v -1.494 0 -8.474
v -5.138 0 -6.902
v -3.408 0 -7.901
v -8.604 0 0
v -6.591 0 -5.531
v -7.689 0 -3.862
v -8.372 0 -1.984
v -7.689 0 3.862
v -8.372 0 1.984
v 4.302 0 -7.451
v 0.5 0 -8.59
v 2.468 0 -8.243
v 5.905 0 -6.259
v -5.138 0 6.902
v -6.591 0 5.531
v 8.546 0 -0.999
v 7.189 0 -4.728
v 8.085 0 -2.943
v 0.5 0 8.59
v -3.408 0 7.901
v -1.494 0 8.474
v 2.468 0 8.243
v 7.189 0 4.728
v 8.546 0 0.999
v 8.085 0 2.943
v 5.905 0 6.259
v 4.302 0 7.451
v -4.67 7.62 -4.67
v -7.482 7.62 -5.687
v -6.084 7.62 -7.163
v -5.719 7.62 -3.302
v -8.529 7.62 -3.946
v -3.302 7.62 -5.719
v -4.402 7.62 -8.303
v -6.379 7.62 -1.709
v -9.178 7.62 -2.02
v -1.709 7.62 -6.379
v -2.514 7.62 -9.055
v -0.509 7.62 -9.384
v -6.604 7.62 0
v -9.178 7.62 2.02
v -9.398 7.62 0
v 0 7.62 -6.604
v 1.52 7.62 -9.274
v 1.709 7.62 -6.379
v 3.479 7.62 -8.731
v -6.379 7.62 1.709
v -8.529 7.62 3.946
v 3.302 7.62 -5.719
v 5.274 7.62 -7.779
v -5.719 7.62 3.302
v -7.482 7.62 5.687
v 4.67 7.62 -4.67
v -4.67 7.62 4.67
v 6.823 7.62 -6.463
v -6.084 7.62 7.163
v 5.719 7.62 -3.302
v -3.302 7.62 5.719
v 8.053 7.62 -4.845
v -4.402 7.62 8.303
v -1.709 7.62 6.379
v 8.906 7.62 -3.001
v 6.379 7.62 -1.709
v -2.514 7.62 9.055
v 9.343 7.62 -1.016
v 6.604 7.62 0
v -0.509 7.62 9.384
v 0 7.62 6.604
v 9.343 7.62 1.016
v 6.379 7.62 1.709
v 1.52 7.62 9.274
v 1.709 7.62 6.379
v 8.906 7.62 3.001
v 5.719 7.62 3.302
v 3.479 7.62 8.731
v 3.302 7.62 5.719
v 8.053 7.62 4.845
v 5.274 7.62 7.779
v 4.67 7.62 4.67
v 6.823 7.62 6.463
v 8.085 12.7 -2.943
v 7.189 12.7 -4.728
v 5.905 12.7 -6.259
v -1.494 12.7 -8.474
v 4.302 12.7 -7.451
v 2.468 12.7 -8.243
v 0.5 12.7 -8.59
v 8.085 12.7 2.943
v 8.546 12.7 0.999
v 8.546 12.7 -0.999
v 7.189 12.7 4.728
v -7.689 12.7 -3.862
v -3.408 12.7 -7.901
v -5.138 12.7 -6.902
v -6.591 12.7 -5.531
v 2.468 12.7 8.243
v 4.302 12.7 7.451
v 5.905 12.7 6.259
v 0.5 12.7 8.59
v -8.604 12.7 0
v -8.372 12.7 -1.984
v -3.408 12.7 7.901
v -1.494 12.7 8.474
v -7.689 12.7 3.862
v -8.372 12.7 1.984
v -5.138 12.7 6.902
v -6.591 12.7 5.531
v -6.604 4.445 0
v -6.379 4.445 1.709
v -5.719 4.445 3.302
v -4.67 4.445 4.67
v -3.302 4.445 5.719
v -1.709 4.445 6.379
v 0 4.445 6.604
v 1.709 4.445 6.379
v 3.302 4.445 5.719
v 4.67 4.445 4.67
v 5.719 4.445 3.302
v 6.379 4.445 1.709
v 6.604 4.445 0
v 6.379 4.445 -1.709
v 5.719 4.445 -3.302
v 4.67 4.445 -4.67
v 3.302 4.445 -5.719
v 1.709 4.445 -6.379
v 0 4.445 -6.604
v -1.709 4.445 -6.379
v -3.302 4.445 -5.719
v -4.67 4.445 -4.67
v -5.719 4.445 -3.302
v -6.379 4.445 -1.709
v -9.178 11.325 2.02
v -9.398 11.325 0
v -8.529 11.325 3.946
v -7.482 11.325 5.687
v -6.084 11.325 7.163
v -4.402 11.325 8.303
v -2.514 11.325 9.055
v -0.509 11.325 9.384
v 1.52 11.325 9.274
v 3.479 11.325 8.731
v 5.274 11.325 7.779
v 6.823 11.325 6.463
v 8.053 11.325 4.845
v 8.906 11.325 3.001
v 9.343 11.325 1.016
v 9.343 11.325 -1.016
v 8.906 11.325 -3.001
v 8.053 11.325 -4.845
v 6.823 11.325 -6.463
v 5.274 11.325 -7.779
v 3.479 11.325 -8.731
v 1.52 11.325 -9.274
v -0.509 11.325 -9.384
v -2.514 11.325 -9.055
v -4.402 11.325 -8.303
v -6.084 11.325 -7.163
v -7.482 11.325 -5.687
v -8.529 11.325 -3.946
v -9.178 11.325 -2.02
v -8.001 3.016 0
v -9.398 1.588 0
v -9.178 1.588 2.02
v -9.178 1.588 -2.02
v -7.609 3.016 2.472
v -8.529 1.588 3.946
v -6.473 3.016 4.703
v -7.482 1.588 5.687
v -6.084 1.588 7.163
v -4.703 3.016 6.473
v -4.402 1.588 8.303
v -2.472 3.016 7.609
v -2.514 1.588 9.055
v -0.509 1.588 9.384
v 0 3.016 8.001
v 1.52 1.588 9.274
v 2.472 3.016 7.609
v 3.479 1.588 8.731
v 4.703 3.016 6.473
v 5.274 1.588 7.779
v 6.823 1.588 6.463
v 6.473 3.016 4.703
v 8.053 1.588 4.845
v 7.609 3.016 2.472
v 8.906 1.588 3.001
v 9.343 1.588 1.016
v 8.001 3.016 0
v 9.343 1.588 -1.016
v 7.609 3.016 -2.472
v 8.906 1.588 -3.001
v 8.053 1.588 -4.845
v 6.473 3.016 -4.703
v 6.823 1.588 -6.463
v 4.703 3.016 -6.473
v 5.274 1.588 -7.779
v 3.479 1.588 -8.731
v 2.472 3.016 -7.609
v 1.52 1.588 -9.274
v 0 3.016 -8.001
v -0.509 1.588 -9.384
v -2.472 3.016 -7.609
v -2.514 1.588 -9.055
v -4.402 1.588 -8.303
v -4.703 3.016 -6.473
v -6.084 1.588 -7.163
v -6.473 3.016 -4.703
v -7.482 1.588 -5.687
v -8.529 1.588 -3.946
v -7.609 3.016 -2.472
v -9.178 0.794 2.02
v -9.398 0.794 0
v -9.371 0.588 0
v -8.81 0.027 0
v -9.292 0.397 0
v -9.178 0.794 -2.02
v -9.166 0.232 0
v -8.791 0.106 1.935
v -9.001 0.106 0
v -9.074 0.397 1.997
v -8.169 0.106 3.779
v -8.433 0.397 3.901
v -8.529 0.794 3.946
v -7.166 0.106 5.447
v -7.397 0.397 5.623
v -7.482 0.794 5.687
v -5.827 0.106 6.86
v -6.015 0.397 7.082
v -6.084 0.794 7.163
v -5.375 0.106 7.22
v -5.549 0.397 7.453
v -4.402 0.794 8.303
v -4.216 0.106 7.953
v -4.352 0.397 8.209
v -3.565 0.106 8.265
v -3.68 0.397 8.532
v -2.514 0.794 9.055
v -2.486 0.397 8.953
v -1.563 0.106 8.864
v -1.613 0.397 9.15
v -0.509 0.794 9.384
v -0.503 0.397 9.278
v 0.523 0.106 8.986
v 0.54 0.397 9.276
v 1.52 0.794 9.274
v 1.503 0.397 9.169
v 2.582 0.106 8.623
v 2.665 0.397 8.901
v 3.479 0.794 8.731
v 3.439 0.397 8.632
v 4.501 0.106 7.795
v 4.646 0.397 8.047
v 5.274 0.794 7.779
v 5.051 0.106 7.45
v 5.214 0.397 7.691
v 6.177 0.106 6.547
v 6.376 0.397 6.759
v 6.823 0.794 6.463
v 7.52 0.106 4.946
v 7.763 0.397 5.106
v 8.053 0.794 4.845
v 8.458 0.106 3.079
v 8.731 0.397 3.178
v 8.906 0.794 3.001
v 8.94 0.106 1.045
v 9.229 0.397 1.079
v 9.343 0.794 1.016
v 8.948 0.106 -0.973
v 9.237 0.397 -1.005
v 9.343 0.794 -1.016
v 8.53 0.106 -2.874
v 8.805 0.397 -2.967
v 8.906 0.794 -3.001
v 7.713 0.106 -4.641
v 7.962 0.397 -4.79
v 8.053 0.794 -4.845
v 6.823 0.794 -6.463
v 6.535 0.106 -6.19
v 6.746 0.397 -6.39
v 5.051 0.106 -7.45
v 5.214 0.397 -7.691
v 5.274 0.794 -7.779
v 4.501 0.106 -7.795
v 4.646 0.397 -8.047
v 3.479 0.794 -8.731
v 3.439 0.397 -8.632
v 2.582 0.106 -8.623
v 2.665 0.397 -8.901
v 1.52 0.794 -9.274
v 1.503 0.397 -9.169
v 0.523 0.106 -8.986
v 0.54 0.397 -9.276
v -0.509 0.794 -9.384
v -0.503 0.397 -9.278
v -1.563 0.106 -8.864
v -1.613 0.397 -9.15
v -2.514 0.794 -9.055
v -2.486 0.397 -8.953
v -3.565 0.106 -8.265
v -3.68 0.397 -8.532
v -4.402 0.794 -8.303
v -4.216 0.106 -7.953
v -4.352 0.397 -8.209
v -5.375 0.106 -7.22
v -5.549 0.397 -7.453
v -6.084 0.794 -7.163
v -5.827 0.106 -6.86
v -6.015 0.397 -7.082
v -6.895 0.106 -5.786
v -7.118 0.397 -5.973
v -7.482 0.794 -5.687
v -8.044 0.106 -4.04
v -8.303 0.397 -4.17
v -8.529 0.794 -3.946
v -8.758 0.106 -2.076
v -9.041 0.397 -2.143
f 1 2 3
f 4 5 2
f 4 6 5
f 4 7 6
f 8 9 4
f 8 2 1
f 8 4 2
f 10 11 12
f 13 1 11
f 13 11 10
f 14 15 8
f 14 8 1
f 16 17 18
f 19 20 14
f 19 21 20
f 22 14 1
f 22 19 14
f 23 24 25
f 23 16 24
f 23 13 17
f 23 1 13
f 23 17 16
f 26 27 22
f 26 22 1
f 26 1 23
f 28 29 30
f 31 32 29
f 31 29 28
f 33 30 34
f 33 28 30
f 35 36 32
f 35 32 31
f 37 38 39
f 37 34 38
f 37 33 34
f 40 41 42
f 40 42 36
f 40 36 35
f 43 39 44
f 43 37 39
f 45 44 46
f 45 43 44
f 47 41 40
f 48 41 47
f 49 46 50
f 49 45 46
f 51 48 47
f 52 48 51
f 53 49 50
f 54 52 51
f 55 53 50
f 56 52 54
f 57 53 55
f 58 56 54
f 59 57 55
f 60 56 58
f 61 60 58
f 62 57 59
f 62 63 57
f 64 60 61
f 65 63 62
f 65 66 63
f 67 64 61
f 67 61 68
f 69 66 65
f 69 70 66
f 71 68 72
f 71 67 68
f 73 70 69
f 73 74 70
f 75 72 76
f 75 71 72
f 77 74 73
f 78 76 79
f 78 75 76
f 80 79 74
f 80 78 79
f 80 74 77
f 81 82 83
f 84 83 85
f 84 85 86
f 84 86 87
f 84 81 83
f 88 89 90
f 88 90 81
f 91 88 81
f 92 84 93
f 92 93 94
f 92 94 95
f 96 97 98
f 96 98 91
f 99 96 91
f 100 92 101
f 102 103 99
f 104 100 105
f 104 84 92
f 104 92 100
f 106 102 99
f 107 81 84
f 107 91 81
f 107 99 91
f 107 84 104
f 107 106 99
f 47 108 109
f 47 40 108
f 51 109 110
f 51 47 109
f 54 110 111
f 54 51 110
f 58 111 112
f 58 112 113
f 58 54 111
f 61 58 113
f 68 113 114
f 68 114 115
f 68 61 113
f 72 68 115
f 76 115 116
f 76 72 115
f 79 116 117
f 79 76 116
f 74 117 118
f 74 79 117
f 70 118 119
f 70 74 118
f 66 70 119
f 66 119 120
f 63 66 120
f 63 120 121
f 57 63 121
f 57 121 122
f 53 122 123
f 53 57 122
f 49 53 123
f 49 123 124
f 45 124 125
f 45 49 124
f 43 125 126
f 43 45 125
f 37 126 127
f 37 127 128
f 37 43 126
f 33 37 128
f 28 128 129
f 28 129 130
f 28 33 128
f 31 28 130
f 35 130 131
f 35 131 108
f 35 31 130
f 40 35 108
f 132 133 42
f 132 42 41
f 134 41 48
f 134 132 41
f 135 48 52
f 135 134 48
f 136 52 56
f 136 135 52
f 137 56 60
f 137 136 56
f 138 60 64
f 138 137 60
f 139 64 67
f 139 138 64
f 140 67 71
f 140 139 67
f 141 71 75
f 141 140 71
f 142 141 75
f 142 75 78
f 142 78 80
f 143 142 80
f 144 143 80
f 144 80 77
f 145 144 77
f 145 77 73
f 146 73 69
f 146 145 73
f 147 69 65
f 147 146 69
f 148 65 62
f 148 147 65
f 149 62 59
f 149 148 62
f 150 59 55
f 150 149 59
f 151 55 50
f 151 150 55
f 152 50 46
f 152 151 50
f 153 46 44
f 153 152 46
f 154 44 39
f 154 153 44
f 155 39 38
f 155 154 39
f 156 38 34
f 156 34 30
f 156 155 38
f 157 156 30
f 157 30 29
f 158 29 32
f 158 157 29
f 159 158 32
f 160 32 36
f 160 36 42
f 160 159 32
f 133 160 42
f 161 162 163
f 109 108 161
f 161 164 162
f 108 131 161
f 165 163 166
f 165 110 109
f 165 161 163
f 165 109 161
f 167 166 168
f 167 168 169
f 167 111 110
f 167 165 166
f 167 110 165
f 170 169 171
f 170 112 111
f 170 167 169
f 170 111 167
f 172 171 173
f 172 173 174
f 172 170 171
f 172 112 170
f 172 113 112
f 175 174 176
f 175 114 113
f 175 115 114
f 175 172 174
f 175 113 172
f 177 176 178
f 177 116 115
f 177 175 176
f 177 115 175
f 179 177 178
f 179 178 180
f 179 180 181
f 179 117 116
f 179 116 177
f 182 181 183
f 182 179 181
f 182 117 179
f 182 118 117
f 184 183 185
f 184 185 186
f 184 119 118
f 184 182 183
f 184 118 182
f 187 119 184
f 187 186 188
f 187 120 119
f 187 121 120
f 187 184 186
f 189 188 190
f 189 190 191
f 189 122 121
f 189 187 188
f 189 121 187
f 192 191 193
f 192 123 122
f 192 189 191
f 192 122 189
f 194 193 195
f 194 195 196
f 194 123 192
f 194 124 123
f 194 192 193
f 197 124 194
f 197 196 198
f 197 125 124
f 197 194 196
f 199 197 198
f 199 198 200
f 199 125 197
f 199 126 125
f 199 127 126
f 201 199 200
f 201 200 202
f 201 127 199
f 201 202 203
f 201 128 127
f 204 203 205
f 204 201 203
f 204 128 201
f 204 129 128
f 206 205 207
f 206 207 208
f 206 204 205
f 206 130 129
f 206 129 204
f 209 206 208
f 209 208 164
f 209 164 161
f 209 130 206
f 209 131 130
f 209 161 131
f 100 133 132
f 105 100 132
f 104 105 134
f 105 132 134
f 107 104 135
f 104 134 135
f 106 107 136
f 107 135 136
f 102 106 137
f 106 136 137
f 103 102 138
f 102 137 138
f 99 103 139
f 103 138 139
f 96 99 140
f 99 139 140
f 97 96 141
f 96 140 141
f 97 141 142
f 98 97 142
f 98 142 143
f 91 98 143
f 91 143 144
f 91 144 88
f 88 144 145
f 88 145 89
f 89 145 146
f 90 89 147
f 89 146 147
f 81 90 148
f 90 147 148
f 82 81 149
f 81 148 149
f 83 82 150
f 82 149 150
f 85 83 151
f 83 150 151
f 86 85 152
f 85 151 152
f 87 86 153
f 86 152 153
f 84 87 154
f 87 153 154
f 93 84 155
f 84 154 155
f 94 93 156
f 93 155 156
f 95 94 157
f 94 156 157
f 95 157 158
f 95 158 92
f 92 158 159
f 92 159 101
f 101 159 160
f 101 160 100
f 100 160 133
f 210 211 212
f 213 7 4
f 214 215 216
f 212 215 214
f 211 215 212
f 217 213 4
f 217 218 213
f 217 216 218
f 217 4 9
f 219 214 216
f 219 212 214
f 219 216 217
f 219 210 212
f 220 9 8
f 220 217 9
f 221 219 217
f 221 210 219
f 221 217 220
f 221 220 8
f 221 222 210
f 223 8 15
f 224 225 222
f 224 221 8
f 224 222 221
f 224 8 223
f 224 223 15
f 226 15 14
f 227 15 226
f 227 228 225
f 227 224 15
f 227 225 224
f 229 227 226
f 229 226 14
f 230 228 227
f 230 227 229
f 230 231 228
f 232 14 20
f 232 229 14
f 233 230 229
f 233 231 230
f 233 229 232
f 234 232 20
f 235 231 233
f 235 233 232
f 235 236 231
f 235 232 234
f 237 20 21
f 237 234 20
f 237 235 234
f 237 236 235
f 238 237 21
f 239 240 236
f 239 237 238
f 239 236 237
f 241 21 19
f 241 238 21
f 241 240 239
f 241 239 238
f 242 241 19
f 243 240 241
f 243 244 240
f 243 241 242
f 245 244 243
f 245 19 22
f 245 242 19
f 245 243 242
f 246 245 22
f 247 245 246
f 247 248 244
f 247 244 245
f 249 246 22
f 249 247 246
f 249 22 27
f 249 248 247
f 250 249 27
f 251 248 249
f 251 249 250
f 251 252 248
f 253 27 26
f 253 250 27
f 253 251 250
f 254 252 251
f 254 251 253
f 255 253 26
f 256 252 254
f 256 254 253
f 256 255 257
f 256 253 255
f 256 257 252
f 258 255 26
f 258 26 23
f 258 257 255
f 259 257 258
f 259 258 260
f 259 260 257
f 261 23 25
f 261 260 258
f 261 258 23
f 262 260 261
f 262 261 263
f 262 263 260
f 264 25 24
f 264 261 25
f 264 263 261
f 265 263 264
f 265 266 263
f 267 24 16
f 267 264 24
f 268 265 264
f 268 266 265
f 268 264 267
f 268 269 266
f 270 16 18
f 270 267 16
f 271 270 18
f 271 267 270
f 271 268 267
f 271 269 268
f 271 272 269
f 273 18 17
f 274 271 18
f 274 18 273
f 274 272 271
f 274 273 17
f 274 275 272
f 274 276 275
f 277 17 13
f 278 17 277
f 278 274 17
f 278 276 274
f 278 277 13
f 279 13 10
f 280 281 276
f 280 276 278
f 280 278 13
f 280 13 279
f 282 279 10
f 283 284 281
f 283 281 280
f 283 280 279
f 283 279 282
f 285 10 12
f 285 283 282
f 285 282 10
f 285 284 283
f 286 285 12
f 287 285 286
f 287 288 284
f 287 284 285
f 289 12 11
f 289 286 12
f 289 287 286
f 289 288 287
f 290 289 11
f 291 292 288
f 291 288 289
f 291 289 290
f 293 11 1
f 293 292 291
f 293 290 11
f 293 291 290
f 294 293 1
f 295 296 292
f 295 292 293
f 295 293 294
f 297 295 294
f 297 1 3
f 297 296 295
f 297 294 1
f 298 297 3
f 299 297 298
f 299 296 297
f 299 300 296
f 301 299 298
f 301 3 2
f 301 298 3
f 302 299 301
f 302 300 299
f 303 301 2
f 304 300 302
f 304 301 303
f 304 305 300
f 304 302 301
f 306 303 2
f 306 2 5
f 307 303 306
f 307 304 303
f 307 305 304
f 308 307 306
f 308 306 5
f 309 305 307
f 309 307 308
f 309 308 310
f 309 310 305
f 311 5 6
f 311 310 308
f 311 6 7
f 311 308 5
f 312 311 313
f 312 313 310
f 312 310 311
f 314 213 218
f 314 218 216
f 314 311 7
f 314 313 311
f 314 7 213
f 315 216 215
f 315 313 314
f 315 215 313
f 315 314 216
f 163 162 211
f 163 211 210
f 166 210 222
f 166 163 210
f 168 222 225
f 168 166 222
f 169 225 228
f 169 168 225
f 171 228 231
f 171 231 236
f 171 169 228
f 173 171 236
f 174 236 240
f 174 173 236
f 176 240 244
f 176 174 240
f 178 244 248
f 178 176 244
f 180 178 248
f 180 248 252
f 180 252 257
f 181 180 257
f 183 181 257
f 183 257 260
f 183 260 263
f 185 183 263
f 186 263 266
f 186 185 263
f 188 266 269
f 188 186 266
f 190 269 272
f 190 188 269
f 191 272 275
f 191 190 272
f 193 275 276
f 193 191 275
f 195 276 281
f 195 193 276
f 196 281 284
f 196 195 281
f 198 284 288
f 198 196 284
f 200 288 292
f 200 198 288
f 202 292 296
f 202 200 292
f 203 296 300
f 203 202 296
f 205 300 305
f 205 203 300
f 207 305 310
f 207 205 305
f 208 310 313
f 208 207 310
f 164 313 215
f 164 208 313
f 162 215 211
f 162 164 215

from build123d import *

# Parameters (mm, degrees)
FILLET1_R      = 0.79375
CHAMFER1_SIZE  = 0.79375
CHAMFER1_SIZE2 = 1.374815329


with BuildPart() as part:
    # Sketch1 → Revolve1 (revolve)
    with BuildSketch(Plane.XY):
        Polygon((0, 0), (-9.398, 0), (-9.398, 1.5875), (-6.604, 4.445), (-6.604, 7.62), (-9.398, 7.62), (-9.398, 12.7), (0, 12.7), align=None)
    revolve(axis=Axis((0, 0, 0), (0, 1, 0)))

    # Fillet1
    fillet1_edges = [part.edges().sort_by_distance(p)[0] for p in [
        (9.398, 0, 0),
    ]]
    fillet(fillet1_edges, radius=FILLET1_R)

    # Chamfer1
    chamfer1_edges = [part.edges().sort_by_distance(p)[0] for p in [
        (9.398, 12.7, 0),
    ]]
    chamfer1_side = [part.faces().sort_by_distance(p)[0] for p in [
        (0, 12.7, 0),
    ]]
    chamfer(chamfer1_edges, length=CHAMFER1_SIZE, length2=CHAMFER1_SIZE2, reference=chamfer1_side[0])


solid = part.part
